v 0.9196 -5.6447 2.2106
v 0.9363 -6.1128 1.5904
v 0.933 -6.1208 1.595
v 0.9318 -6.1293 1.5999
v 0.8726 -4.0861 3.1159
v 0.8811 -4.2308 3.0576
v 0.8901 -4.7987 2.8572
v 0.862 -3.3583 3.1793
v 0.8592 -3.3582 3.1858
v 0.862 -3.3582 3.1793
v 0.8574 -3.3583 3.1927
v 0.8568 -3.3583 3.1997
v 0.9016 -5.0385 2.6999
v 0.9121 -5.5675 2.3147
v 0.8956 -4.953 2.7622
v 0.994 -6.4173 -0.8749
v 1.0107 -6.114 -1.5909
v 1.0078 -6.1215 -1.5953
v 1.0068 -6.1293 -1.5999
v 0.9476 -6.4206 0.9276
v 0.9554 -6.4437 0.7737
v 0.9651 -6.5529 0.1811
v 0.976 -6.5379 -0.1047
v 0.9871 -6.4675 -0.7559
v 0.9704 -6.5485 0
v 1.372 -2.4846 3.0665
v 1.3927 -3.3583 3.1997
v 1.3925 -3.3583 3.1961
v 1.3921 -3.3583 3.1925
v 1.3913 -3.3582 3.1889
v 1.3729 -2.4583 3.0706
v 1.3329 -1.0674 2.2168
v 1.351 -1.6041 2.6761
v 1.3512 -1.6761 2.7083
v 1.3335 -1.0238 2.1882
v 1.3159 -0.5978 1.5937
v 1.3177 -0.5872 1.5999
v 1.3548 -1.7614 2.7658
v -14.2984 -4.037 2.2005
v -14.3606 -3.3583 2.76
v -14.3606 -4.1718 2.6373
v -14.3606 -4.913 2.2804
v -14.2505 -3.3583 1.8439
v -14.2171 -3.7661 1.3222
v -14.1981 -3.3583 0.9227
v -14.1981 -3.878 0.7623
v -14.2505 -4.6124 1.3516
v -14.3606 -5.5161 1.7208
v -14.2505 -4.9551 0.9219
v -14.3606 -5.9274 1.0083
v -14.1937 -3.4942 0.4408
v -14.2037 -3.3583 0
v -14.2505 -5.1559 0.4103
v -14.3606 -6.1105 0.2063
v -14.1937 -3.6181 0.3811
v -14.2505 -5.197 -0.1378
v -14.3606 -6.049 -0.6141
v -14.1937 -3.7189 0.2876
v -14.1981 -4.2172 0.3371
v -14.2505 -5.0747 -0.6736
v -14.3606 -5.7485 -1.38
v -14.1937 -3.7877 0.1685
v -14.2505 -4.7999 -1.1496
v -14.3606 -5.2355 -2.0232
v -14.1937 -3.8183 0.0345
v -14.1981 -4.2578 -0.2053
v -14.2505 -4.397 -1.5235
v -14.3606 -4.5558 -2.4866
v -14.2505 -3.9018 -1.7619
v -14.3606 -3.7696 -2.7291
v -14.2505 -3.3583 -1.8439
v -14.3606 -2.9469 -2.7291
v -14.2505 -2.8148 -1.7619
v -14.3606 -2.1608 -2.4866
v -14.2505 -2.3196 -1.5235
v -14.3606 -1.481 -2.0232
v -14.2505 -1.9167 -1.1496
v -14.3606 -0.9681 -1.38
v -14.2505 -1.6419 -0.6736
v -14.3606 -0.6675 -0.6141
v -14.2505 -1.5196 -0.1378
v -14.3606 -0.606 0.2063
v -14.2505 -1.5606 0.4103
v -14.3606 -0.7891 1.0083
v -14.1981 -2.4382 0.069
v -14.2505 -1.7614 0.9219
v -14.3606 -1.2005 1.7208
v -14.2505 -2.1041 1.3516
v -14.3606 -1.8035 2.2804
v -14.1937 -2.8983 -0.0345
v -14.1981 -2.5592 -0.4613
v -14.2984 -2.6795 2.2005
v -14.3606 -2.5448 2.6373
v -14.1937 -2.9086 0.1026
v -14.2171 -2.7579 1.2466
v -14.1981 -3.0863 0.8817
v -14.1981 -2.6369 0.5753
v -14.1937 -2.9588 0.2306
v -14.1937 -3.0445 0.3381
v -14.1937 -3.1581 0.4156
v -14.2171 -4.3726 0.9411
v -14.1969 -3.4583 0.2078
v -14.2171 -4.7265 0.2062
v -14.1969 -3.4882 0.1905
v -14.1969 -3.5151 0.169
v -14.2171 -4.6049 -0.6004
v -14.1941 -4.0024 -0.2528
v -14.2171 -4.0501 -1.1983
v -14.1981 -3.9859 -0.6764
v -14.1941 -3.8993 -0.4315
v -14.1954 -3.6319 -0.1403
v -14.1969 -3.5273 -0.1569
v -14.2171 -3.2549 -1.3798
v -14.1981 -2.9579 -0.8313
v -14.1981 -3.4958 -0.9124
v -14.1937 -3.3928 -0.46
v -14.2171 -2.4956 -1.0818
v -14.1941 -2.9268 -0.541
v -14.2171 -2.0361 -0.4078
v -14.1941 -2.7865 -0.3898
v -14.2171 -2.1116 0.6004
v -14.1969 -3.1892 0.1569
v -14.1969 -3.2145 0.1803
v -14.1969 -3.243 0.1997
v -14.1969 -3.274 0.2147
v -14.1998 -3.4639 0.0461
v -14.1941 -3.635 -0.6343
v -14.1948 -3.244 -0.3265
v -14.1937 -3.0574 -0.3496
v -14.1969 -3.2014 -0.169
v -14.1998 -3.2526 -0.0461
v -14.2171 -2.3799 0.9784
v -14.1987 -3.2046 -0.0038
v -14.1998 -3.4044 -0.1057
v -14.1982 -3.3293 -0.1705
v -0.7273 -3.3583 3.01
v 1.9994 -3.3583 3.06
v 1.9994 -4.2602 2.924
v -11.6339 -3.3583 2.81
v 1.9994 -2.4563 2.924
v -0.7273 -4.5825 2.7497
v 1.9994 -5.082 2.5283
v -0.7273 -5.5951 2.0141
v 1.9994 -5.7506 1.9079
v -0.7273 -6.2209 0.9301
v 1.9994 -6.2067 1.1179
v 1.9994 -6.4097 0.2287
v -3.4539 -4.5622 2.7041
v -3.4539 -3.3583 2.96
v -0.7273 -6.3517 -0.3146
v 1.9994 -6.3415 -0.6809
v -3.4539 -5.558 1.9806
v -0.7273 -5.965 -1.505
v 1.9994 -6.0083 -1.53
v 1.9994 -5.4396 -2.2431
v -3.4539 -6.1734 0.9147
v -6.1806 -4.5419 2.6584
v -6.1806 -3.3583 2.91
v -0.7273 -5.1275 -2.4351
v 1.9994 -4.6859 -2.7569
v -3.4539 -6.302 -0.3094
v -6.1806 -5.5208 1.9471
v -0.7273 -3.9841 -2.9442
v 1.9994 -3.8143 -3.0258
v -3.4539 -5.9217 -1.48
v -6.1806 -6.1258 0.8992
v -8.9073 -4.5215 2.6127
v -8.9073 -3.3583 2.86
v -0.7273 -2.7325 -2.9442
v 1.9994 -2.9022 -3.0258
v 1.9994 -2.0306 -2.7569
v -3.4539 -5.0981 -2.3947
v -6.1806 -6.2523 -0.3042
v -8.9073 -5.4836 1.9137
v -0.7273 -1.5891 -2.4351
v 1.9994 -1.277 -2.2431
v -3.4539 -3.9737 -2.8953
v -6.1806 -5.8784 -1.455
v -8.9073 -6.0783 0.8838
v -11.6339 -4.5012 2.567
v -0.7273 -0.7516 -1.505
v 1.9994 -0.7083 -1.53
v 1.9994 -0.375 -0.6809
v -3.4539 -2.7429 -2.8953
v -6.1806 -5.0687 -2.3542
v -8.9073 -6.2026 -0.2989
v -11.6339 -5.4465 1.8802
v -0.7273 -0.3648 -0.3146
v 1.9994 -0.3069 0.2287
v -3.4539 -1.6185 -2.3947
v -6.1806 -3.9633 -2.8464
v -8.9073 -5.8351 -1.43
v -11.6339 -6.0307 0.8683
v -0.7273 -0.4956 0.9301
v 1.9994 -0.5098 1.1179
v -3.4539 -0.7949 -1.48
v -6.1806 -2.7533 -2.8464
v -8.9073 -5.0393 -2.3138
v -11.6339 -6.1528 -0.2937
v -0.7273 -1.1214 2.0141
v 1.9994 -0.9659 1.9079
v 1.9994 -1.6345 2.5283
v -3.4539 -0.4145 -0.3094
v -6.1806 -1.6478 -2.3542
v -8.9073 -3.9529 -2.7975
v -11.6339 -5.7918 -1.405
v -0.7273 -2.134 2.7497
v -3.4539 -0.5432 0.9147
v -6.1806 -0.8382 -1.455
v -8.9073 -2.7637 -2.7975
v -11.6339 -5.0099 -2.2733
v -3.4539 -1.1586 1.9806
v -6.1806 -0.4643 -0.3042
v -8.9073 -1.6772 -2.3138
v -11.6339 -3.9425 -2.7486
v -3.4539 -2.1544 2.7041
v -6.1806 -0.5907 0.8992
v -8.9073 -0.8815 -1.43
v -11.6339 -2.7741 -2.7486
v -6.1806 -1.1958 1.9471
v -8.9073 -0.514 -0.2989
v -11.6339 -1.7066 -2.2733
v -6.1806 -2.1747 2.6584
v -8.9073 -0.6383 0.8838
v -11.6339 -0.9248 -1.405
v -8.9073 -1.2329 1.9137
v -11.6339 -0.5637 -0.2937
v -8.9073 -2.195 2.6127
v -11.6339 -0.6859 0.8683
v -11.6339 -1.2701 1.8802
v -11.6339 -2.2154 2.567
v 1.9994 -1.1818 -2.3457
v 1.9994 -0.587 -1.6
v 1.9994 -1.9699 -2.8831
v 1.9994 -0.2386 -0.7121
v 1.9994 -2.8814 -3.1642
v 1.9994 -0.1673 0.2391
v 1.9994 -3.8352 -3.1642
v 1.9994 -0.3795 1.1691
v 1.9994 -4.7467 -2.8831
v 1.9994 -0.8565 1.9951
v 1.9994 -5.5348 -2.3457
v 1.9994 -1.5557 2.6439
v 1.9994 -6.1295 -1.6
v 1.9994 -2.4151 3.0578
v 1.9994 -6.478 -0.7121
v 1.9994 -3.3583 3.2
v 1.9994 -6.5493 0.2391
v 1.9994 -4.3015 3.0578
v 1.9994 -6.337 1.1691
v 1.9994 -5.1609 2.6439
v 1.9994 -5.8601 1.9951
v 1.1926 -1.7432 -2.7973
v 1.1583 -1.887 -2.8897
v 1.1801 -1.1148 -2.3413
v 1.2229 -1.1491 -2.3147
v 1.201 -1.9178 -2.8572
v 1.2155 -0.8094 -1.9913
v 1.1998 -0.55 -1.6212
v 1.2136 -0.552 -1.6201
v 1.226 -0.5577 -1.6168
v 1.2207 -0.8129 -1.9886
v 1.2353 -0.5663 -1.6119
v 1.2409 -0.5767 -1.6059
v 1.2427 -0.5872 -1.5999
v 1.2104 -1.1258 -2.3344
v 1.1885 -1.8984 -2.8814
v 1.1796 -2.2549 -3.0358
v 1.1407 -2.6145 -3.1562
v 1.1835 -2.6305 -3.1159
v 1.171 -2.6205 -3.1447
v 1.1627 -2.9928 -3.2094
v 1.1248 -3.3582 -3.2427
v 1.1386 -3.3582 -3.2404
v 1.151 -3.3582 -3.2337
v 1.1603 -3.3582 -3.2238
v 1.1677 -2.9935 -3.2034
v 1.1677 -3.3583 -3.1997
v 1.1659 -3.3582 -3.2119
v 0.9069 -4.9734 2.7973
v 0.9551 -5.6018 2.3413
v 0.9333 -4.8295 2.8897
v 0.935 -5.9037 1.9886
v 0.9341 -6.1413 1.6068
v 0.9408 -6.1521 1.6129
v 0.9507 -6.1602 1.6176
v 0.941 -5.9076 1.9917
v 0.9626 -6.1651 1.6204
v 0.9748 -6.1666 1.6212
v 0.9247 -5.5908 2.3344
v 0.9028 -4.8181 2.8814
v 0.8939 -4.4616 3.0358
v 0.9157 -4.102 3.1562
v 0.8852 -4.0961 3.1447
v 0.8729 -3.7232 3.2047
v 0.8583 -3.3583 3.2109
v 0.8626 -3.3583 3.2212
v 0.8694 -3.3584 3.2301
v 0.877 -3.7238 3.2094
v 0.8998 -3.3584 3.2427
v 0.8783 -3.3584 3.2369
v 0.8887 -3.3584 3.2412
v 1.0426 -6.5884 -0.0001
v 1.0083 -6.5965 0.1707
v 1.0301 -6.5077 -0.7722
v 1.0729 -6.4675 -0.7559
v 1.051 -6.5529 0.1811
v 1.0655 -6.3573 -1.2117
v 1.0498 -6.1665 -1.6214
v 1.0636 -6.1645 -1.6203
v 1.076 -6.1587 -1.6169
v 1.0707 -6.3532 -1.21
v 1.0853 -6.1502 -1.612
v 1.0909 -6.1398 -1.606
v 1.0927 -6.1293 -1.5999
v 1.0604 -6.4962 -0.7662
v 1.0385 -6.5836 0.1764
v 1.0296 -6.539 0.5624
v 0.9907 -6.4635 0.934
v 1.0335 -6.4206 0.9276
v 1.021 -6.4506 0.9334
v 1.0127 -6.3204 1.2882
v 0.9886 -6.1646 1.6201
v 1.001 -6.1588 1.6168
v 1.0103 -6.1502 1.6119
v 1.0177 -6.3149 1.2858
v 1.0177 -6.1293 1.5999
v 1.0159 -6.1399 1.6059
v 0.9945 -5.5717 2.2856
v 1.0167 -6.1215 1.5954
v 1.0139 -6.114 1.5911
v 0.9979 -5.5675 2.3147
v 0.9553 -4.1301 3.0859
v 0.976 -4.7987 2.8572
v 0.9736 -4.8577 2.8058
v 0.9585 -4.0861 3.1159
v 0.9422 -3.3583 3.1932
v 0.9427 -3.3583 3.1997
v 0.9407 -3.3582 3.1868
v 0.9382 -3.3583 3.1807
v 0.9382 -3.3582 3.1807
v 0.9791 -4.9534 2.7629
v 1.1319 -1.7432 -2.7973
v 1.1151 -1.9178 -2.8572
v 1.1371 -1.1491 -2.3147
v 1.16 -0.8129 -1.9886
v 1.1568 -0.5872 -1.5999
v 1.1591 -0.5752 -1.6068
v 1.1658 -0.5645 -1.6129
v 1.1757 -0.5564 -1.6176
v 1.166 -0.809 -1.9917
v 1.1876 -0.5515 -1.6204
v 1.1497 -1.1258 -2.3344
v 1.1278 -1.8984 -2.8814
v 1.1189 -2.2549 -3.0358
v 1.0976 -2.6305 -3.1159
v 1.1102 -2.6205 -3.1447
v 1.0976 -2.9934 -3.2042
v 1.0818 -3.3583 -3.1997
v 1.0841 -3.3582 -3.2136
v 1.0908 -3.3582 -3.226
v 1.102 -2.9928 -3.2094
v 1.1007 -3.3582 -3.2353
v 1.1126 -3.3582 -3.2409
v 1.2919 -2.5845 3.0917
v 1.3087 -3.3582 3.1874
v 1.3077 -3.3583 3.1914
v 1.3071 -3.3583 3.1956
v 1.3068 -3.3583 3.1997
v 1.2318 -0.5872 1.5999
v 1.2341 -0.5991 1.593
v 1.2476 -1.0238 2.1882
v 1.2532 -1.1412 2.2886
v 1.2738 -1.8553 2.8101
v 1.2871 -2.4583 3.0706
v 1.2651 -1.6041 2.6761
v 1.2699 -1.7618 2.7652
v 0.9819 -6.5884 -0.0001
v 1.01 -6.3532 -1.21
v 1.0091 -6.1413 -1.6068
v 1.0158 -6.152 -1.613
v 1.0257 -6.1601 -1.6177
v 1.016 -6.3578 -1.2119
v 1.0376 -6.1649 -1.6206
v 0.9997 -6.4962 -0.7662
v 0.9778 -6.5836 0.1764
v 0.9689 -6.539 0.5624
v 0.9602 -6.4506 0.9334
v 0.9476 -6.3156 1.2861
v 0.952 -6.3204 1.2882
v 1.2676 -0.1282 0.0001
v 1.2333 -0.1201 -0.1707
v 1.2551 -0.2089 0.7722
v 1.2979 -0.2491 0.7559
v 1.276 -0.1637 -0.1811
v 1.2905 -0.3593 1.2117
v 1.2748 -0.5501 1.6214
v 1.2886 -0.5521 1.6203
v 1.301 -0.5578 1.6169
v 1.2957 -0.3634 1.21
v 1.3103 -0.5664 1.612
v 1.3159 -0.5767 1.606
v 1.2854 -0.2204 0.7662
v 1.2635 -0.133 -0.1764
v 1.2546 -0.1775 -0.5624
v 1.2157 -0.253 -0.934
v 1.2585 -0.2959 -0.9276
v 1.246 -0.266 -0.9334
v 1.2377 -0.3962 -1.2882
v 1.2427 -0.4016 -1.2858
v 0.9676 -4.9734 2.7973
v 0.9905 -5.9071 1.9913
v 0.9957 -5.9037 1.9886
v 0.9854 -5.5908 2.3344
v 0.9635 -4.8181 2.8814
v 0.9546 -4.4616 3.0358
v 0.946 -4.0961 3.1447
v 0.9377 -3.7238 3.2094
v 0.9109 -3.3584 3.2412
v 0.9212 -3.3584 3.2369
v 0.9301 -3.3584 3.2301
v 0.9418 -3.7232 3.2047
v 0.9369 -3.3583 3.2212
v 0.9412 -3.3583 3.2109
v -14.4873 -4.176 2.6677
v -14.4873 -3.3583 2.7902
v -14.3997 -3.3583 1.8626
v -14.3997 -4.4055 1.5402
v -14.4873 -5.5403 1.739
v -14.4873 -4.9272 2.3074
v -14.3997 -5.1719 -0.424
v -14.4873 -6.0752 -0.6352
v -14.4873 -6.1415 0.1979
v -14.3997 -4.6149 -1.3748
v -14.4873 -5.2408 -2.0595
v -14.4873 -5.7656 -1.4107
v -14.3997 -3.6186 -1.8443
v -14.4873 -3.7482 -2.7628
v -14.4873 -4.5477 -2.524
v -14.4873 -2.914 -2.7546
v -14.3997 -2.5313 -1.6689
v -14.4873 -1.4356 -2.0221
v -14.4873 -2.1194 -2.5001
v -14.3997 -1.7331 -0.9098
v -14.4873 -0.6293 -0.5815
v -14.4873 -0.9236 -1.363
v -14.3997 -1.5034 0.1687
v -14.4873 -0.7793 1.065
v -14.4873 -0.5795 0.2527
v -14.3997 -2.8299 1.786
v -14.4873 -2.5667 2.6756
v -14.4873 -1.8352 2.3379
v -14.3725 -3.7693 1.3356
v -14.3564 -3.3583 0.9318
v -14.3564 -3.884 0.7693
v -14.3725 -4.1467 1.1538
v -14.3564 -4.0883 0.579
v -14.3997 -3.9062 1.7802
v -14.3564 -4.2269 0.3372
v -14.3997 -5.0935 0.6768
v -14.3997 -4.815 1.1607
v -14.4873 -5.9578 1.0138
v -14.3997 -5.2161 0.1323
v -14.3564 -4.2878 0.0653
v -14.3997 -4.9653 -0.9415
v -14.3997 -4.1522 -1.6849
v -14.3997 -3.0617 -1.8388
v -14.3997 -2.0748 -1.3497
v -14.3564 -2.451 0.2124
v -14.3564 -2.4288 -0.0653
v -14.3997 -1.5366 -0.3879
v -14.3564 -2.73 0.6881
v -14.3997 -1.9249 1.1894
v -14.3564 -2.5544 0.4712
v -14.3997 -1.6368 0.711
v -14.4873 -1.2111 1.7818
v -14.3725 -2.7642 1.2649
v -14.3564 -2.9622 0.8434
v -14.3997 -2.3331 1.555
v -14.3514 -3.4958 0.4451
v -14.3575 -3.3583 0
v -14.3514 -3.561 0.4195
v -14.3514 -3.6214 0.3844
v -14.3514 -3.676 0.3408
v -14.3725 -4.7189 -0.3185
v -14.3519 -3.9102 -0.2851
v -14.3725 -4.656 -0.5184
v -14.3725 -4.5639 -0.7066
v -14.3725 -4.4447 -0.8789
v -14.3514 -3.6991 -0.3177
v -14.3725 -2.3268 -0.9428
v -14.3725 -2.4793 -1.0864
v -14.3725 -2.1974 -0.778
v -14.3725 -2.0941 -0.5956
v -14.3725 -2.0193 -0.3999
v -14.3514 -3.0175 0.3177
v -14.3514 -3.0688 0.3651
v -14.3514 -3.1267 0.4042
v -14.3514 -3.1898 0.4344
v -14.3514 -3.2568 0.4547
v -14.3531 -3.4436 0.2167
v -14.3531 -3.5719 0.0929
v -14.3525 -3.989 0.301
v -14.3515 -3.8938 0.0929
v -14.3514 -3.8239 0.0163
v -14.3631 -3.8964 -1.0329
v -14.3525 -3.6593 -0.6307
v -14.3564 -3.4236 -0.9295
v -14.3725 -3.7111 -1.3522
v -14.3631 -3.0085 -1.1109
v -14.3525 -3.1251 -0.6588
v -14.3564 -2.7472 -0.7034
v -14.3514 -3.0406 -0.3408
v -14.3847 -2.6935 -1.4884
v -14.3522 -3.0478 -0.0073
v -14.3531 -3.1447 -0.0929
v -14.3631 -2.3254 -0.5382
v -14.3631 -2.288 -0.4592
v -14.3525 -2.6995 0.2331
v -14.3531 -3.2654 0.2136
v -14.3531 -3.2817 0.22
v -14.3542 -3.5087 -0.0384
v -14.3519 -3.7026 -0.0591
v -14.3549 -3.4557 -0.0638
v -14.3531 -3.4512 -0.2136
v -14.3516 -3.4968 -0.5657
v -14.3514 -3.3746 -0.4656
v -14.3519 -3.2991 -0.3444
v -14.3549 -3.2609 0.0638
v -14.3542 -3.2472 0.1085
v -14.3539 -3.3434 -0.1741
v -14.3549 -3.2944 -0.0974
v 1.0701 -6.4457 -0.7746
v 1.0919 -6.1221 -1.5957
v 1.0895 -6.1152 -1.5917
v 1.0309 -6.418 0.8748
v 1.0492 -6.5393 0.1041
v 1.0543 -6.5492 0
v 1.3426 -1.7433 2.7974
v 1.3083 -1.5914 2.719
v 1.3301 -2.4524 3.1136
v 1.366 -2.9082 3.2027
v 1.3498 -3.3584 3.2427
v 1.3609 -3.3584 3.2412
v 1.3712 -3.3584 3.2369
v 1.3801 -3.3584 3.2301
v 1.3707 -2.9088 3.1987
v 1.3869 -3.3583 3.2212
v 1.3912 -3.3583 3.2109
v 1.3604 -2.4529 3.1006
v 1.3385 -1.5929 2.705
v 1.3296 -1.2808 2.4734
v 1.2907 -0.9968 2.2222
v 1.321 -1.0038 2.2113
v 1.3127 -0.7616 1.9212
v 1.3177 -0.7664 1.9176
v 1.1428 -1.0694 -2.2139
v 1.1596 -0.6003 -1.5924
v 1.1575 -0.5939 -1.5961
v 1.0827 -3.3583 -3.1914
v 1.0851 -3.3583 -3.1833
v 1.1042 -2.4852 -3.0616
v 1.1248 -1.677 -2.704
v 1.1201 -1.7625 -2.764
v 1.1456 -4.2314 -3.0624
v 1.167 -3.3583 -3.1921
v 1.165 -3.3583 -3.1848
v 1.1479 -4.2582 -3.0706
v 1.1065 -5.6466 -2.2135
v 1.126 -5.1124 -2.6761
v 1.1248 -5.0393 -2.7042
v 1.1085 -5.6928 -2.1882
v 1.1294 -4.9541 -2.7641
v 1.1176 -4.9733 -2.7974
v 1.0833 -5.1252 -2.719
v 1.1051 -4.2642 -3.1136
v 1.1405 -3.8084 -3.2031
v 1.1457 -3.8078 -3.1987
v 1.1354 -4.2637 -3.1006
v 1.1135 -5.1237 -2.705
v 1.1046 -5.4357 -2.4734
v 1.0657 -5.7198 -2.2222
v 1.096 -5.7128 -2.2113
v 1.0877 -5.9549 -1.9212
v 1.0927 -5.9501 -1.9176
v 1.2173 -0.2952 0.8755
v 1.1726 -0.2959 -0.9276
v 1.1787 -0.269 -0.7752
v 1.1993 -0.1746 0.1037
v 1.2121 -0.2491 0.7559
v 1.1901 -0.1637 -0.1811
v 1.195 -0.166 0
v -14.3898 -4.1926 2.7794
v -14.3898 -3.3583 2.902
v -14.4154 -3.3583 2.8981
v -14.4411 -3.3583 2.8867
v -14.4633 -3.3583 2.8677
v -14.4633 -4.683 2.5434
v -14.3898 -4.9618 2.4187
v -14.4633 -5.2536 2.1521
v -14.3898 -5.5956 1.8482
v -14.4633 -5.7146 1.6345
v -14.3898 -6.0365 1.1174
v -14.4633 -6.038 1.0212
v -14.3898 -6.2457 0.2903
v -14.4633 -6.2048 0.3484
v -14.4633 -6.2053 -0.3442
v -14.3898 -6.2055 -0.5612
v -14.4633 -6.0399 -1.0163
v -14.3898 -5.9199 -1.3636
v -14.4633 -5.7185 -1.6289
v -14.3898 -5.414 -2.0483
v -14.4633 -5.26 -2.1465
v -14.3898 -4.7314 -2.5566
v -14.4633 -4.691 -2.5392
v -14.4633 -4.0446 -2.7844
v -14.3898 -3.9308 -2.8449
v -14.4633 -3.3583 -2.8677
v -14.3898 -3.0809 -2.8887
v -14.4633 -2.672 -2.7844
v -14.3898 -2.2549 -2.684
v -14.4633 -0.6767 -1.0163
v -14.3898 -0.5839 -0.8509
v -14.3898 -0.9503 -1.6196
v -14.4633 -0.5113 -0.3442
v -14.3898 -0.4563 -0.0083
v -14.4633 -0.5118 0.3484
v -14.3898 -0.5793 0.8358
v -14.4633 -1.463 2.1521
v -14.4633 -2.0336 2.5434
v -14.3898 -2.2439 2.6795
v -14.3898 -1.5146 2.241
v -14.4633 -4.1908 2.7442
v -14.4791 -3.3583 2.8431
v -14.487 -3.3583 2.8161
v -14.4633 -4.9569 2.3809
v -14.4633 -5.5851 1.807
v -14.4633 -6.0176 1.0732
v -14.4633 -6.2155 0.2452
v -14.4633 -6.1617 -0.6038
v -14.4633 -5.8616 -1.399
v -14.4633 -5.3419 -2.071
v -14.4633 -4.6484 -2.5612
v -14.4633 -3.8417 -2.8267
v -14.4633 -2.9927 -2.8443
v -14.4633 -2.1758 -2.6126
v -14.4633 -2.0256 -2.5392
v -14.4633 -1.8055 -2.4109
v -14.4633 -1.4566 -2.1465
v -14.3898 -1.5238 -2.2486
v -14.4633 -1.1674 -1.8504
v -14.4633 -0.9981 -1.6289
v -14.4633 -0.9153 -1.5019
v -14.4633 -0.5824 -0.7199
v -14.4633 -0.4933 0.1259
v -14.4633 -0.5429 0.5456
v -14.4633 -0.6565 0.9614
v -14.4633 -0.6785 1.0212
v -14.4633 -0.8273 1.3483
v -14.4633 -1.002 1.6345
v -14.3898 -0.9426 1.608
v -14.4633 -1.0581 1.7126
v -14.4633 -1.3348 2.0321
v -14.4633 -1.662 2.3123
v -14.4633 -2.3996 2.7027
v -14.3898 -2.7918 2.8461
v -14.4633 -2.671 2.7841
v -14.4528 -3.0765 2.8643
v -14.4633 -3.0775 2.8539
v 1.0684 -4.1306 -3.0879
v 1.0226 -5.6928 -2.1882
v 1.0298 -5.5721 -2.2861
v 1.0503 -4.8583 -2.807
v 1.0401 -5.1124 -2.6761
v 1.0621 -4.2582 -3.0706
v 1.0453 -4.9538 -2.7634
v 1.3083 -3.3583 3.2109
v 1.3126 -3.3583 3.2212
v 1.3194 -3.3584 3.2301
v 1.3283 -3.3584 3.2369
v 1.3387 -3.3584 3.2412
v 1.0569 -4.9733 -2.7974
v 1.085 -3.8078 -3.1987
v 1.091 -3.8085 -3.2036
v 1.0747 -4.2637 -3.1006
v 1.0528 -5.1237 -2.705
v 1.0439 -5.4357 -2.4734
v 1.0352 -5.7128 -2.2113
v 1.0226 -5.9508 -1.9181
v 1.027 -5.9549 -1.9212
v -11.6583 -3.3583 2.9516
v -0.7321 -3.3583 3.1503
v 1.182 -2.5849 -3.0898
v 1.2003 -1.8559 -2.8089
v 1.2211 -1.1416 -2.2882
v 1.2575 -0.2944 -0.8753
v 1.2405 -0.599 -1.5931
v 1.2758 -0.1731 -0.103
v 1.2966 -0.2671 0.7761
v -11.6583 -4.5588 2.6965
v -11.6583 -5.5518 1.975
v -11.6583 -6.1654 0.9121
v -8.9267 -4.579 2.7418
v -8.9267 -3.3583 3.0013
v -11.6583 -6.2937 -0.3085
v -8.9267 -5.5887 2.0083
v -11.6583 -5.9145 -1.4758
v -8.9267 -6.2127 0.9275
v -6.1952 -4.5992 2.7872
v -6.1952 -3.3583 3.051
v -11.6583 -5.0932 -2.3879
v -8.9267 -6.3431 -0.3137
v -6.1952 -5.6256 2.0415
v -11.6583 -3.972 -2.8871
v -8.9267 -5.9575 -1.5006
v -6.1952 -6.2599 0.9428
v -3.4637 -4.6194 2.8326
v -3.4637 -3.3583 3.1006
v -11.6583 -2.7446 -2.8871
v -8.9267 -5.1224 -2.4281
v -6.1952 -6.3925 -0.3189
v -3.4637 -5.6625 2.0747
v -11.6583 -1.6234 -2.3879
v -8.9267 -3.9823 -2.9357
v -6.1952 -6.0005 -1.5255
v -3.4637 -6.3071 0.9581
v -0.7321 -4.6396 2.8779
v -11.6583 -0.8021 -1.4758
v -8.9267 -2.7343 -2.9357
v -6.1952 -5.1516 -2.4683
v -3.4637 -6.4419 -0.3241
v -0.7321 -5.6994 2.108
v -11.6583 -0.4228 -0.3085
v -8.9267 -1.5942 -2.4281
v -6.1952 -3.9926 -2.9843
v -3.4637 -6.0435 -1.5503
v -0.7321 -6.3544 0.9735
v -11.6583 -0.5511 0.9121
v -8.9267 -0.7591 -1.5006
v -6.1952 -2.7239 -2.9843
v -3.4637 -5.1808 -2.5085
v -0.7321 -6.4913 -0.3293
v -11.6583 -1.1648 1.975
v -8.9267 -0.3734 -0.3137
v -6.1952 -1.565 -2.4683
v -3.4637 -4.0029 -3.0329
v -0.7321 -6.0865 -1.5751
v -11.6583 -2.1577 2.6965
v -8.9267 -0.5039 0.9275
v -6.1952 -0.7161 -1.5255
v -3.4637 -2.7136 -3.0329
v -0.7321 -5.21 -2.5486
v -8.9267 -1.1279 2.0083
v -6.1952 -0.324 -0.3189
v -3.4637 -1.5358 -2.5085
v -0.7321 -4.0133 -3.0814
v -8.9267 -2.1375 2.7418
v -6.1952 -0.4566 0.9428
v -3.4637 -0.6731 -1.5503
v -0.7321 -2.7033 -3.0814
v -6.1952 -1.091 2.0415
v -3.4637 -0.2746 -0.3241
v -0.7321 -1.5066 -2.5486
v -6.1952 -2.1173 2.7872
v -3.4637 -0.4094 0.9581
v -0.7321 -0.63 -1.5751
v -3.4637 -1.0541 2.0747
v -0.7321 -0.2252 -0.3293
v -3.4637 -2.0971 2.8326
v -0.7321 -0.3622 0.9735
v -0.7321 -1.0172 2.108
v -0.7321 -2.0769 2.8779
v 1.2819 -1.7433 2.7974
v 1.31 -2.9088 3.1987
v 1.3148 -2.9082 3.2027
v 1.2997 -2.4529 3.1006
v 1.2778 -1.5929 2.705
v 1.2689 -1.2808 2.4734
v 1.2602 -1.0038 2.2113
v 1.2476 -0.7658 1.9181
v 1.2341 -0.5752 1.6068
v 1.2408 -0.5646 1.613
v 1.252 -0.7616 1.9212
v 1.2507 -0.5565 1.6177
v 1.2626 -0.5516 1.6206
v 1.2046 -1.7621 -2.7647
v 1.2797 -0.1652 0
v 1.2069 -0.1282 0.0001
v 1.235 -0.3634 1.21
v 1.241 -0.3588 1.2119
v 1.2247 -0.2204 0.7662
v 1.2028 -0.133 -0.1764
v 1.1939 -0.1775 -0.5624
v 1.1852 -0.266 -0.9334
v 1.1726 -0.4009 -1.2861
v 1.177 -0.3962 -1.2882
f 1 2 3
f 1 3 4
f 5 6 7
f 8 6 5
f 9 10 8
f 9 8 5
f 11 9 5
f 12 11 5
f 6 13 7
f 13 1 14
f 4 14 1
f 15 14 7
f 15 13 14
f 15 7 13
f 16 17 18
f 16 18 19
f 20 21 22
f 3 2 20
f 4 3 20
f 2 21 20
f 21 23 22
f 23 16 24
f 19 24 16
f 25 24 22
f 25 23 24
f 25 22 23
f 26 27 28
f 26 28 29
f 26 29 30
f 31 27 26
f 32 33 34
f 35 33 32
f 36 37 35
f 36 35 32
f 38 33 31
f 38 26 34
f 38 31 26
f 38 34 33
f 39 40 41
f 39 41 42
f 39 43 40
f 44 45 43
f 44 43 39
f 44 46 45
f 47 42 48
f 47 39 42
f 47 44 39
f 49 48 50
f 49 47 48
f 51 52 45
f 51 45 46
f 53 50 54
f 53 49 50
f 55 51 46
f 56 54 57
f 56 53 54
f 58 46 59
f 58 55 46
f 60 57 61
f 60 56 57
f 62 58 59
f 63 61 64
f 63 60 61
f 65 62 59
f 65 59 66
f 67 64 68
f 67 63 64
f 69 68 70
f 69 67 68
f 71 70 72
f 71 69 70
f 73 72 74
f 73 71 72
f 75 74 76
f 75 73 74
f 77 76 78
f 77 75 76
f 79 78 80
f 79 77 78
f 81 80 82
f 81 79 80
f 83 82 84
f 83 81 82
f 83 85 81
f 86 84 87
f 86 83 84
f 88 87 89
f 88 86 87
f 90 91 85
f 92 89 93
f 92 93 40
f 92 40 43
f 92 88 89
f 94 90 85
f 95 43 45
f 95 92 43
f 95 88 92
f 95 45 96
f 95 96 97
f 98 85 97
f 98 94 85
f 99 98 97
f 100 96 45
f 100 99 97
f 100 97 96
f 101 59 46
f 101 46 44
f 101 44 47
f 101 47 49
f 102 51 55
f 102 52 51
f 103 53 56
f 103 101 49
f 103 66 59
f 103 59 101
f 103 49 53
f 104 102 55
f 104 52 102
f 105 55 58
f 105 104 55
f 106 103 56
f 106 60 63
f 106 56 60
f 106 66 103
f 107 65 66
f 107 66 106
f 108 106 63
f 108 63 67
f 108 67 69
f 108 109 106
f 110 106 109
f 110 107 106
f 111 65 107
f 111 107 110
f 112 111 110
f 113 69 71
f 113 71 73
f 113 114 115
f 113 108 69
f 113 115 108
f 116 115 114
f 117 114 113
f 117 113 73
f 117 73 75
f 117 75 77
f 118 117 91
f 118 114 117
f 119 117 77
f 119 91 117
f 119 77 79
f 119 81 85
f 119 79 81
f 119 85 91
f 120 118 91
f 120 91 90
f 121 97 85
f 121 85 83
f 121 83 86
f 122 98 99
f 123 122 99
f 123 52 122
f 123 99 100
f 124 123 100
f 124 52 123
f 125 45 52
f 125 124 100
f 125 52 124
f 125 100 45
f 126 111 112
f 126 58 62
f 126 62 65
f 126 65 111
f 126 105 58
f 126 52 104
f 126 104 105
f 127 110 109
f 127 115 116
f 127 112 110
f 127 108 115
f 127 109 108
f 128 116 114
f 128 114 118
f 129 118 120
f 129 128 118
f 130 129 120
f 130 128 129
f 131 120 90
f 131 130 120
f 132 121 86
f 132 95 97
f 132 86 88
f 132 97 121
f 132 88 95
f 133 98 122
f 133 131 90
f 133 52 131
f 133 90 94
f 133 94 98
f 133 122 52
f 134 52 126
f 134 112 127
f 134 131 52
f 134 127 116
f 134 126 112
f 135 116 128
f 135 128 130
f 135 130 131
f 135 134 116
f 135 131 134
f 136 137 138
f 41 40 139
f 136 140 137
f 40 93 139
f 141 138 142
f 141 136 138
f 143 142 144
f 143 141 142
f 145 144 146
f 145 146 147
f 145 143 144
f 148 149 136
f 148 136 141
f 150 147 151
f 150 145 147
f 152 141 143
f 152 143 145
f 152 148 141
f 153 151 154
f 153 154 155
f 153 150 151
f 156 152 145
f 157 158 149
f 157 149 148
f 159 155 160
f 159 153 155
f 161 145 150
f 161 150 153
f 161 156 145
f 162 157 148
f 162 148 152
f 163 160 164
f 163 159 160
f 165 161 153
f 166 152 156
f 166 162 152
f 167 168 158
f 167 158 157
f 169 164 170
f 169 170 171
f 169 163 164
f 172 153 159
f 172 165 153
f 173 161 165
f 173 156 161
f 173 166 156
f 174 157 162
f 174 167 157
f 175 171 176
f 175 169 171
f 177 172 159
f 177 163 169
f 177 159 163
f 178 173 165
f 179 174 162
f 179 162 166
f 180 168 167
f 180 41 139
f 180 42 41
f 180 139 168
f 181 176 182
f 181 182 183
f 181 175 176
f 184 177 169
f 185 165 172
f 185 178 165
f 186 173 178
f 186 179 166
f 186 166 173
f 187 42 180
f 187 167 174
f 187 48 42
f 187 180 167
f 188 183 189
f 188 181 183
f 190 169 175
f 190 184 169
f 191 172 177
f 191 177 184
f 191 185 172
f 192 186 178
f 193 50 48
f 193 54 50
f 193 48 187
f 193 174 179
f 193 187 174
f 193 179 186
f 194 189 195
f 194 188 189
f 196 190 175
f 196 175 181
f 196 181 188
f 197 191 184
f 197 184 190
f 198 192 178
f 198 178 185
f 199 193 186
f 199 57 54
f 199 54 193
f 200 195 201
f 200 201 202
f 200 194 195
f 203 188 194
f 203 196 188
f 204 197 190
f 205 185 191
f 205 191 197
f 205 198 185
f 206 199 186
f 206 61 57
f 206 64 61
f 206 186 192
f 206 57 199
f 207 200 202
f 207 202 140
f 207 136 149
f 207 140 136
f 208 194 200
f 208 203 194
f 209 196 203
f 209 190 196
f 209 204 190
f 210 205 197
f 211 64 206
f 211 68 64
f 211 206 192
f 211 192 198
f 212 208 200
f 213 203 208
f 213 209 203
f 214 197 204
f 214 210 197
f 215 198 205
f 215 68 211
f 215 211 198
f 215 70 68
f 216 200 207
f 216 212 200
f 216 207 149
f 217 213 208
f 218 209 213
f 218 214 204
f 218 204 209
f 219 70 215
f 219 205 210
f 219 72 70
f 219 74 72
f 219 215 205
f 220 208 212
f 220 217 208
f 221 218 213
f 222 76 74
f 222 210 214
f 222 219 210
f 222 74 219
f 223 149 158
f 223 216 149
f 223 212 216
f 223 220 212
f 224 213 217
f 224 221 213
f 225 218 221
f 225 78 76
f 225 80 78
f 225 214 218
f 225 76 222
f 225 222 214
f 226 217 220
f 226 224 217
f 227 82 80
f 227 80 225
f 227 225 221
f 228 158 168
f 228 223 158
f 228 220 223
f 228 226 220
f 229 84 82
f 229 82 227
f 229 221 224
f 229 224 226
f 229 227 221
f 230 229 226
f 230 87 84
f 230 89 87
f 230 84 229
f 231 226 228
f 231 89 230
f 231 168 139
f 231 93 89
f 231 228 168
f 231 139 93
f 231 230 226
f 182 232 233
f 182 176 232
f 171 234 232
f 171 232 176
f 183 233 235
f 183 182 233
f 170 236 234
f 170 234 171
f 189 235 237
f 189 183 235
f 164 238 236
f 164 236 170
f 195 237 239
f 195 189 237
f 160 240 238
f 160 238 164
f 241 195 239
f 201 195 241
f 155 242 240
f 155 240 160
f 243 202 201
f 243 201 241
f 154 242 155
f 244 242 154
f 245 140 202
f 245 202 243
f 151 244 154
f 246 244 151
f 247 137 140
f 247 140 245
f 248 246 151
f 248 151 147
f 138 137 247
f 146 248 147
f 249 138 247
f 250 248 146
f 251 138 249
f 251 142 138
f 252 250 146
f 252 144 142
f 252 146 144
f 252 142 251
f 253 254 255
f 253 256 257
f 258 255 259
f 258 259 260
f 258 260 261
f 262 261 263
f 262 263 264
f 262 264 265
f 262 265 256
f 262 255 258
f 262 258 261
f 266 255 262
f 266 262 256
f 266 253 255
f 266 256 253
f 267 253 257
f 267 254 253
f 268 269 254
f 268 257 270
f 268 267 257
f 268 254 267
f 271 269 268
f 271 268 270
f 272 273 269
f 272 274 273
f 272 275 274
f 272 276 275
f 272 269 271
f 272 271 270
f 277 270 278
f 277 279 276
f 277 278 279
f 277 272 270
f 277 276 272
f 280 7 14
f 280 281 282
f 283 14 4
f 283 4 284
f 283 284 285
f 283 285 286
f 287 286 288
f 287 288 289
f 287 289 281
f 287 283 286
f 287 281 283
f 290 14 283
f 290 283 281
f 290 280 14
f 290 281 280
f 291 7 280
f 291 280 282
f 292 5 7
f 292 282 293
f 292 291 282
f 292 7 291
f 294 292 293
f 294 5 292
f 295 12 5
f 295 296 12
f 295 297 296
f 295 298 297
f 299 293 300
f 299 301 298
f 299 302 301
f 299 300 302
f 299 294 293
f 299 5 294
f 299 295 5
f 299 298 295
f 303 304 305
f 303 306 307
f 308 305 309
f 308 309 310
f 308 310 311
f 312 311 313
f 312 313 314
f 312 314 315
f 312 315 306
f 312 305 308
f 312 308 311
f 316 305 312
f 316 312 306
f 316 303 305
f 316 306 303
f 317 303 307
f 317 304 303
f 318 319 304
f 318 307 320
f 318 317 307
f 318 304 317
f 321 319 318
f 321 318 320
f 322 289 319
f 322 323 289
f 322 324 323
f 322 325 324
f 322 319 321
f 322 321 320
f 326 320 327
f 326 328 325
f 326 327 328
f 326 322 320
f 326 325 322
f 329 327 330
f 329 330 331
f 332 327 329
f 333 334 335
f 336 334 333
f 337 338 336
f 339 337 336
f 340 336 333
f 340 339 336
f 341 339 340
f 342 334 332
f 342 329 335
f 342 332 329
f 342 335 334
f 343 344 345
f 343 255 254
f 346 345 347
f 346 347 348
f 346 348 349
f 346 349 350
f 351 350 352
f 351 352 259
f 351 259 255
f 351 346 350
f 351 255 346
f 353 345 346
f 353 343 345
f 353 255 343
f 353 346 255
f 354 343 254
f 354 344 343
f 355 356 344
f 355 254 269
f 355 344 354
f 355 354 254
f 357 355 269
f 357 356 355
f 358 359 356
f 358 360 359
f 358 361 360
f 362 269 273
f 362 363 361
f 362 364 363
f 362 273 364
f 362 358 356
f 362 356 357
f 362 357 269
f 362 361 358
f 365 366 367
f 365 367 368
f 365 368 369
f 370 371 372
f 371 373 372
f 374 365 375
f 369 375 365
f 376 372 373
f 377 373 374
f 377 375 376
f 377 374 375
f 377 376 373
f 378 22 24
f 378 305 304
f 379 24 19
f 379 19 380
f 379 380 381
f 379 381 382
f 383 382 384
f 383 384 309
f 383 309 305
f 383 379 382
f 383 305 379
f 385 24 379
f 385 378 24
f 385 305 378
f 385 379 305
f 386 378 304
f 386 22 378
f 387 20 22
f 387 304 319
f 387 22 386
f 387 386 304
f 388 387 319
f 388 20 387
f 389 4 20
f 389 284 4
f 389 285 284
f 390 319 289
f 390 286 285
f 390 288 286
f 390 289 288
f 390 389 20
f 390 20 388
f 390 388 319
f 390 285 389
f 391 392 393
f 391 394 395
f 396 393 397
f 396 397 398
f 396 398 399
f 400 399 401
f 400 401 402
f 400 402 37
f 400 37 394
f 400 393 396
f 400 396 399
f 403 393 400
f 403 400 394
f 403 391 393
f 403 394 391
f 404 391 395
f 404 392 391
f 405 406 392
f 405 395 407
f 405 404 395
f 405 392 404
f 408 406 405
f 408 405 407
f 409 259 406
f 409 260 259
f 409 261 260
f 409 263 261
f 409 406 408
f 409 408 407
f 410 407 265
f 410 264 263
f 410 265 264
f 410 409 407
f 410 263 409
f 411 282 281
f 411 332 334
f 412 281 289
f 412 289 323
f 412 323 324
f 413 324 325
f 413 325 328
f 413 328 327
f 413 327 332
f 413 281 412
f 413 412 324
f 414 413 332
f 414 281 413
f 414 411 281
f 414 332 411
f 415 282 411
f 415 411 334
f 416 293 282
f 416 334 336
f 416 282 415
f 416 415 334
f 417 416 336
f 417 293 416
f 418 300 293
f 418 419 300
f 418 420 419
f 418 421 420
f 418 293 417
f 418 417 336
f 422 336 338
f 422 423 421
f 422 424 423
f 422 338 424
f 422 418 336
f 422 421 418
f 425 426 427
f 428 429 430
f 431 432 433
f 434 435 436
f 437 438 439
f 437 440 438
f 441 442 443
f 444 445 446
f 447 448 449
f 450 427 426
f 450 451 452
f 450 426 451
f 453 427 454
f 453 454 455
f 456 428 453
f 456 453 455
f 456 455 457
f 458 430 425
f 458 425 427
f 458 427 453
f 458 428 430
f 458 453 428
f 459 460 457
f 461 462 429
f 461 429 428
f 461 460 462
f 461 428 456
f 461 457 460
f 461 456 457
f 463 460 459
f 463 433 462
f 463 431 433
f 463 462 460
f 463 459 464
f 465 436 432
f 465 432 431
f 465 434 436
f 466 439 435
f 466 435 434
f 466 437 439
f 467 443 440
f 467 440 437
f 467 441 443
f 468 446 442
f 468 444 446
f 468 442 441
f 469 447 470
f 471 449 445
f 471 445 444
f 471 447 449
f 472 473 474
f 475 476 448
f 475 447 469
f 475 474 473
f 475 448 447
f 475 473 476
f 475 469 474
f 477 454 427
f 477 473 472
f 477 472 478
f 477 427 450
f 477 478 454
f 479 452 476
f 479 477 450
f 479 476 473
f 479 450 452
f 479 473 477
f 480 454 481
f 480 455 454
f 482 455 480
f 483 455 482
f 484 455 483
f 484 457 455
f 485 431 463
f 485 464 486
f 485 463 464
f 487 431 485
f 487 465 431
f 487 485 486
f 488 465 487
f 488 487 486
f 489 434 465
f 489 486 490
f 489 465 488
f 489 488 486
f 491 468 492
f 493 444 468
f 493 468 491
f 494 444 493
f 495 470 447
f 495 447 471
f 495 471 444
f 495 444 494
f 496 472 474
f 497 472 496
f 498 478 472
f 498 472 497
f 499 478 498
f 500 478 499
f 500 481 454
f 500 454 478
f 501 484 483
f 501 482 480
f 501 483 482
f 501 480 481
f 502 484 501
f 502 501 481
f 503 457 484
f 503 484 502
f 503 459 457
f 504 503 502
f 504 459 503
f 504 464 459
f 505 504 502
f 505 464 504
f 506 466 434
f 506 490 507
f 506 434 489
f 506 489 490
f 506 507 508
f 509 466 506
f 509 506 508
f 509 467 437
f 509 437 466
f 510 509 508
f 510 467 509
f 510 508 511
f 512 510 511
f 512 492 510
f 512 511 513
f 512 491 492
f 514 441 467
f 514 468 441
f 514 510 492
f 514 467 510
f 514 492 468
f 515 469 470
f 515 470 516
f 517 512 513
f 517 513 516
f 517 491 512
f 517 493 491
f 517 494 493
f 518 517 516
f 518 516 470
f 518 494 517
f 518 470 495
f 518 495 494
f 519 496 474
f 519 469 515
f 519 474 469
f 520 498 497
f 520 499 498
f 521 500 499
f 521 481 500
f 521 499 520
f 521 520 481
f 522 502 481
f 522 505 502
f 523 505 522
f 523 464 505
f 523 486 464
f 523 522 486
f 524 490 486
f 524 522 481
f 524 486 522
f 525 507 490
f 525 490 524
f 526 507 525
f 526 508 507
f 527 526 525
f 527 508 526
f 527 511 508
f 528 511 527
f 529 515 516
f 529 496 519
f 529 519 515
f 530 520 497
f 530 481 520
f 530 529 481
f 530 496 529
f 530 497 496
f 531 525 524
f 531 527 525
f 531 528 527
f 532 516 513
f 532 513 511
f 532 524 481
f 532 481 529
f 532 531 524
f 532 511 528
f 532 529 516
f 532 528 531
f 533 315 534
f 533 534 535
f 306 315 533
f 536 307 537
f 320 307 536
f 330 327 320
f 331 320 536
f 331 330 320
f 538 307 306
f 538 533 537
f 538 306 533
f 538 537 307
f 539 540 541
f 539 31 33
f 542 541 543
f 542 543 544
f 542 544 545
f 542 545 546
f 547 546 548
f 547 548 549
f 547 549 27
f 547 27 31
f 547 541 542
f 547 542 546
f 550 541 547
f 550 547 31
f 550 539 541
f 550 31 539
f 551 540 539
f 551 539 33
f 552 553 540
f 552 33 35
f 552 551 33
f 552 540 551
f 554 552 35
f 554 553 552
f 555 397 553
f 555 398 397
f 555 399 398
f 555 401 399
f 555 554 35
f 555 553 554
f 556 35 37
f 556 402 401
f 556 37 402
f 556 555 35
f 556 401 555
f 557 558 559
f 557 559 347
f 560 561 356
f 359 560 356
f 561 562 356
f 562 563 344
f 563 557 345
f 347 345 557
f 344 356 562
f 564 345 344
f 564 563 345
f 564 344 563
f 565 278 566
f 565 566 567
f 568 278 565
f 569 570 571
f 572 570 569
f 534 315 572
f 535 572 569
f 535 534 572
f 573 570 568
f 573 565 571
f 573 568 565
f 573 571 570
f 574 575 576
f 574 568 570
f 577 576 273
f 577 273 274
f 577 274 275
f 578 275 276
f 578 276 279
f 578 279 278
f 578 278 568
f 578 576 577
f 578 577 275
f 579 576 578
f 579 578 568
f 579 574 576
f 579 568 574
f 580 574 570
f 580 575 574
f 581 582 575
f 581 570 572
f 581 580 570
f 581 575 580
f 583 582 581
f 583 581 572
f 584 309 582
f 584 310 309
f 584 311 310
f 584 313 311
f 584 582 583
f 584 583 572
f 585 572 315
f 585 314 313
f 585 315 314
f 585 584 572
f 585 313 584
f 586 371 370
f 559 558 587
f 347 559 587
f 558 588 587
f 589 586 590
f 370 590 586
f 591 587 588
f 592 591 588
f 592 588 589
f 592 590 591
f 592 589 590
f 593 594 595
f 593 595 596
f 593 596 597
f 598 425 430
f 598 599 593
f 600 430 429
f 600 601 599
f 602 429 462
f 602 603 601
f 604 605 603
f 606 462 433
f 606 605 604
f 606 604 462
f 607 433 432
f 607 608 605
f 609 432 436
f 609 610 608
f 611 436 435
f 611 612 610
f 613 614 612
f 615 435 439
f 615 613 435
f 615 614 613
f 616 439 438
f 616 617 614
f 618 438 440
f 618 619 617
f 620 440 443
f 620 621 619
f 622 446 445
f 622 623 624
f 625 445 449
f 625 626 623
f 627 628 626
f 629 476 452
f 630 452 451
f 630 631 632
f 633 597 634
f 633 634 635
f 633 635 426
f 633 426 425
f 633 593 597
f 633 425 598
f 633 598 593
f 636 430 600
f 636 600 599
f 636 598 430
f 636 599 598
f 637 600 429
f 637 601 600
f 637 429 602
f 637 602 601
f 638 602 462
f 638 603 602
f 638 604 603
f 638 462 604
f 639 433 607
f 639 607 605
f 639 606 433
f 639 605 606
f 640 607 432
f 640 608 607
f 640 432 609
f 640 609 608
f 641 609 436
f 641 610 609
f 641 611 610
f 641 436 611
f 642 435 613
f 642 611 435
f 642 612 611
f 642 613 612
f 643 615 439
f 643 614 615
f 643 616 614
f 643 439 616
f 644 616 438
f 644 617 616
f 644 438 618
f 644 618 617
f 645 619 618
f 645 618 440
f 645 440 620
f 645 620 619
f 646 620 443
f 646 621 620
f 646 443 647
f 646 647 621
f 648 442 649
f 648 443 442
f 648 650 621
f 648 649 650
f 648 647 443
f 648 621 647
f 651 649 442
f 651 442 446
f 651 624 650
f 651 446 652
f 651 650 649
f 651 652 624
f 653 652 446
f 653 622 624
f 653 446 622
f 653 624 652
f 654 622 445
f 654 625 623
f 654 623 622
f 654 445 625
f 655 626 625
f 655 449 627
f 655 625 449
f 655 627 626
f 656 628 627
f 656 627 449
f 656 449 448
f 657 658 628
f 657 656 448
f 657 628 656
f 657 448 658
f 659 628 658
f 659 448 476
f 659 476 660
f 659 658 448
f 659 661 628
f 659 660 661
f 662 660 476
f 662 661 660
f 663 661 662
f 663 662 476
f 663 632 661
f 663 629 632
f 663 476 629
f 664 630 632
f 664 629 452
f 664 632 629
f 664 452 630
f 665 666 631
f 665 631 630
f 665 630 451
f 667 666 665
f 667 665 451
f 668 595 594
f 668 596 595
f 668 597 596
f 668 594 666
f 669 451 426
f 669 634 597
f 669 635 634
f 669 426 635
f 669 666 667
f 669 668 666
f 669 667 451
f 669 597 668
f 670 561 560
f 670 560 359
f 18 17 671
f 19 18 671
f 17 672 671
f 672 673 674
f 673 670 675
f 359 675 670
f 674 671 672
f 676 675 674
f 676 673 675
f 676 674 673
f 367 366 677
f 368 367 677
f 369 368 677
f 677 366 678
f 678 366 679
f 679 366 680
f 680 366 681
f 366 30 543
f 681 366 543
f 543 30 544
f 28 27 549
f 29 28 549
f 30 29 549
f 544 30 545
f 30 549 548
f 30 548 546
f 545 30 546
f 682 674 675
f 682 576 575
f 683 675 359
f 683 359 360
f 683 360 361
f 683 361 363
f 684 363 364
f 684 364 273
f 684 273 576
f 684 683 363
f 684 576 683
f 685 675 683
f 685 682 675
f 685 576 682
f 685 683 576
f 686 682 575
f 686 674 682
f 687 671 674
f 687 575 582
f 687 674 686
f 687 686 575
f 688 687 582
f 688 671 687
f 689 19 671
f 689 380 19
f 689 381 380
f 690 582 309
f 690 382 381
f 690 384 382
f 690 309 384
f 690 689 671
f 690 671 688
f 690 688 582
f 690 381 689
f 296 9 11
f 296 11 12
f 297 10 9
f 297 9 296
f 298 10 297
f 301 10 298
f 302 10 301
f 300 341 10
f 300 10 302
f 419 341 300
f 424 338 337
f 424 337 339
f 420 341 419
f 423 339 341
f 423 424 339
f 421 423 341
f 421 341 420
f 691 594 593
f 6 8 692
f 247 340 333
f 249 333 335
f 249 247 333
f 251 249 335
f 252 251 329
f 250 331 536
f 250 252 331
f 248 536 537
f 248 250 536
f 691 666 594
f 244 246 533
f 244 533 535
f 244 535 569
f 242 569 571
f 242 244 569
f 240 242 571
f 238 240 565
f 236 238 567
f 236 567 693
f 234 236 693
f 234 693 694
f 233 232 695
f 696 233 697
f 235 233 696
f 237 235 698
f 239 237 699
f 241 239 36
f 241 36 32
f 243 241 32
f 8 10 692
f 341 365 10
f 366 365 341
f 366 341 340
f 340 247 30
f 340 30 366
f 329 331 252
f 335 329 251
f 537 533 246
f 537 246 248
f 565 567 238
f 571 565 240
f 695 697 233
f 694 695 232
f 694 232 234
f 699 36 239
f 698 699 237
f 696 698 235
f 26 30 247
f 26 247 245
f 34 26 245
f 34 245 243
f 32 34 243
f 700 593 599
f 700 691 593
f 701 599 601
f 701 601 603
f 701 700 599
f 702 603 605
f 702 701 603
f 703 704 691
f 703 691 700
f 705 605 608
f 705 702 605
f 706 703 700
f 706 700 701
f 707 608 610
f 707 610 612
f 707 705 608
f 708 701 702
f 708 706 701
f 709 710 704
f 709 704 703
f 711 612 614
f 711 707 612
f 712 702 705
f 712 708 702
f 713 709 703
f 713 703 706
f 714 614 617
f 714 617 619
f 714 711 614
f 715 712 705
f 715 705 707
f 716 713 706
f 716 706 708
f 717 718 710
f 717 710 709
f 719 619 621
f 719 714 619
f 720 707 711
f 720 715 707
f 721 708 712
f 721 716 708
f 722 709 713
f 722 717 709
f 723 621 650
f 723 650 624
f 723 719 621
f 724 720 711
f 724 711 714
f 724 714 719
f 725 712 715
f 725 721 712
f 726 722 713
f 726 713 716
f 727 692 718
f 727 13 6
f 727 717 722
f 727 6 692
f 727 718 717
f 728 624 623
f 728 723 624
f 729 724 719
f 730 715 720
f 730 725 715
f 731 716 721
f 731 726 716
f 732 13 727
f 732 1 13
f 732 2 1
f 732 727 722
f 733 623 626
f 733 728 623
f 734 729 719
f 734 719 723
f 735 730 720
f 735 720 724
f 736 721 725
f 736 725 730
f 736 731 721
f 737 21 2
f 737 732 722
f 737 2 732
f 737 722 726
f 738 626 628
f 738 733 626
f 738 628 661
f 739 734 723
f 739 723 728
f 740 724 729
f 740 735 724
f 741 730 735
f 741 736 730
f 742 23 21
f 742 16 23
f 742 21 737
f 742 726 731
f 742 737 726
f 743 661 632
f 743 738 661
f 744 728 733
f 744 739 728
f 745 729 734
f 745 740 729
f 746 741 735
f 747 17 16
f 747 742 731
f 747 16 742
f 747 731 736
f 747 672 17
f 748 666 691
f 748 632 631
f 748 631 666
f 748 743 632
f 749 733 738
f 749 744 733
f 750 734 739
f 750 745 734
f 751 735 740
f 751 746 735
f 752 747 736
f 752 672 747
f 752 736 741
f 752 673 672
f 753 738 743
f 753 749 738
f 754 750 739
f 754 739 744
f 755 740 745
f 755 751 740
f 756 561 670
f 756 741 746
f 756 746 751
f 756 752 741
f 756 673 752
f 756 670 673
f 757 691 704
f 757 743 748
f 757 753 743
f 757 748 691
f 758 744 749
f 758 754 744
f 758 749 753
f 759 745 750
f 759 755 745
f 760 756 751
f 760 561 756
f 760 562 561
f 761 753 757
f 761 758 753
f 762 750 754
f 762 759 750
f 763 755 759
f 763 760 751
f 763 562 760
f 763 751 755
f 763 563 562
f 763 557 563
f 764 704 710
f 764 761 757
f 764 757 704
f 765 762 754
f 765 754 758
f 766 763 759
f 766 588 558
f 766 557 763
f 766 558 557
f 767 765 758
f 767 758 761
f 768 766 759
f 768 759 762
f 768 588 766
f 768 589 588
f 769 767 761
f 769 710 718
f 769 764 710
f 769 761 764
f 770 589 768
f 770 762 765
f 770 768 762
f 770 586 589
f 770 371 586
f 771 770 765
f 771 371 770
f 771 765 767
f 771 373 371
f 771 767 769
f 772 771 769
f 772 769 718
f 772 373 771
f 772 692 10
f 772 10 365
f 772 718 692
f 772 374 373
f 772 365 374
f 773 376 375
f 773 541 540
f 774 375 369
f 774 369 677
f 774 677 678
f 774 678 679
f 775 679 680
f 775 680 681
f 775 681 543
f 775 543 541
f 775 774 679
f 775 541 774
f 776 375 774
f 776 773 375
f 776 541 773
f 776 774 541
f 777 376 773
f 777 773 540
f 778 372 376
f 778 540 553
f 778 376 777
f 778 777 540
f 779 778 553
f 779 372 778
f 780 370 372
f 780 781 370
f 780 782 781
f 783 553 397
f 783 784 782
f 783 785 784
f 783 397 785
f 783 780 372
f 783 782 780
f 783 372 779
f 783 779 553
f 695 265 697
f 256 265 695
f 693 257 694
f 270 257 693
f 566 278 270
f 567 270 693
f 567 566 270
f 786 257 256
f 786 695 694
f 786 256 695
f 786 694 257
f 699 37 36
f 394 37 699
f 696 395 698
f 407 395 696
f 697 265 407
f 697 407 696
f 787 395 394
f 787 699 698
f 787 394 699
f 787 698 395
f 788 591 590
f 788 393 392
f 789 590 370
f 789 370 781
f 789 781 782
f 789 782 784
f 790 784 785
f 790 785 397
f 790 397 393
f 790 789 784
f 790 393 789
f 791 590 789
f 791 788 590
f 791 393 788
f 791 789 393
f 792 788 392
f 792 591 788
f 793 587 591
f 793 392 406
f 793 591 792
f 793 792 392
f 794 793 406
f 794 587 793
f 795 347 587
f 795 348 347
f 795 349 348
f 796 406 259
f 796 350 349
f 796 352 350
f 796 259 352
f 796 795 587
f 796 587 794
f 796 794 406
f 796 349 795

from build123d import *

# Parameters (mm, degrees)
SWEEP_1_PITCH = 0.45
FILLET_3_R    = 0.1


with BuildPart() as part:
    # 草图1 → 旋转3 (revolve)
    with BuildSketch(Plane.XY, mode=Mode.PRIVATE) as revolve_3_sk:
        with BuildLine():
            Line((-14.500599108, -0.458323283), (1.999400892, -0.158323283))
            Line((1.999400892, -0.158323283), (1.999400892, -0.298323283))
            Line((1.999400892, -0.298323283), (-14.360599108, -0.598323283))
            ThreePointArc((-14.360599108, -0.598323283), (-14.217076798, -1.974601707), (-14.203691623, -3.358278617))
            Line((-14.203691623, -3.358278617), (-14.357505029, -3.358278617))
            ThreePointArc((-14.357505029, -3.358278617), (-14.375184367, -1.905642927), (-14.500599108, -0.458323283))
        make_face()
    revolve(revolve_3_sk.sketch.rotate(Axis((-14.483691623, -3.358278617, 0), (1, 0, 0)), 90), axis=Axis((-14.483691623, -3.358278617, 0), (1, 0, 0)))

    # 扫描1: arcs per turn and ends read off the stored shape
    # 扫描1: the profile of 草图9 screwed along a right-hand helix through 1 turns, 6 arcs to a turn; built about Z, then put on its axis
    sweep_1_z = Axis((0, 0, 0), (0, 0, 1))
    sweep_1_corners = [(3.199748648, 5.52e-07, 0.407301454), (3.15682446, 0.000111601, 0.450225786), (3.199748648, 5.52e-07, 0.493150117), (3.242672835, -0.000110498, 0.450225786)]
    with BuildLine(mode=Mode.PRIVATE) as sweep_1_profile:
        ThreePointArc((3.199748648, 5.52e-07, 0.407301454), (3.169396663, 7.9075e-05, 0.4198737), (3.15682446, 0.000111601, 0.450225786))
        ThreePointArc((3.15682446, 0.000111601, 0.450225786), (3.169396663, 7.9075e-05, 0.480577871), (3.199748648, 5.52e-07, 0.493150117))
        ThreePointArc((3.199748648, 5.52e-07, 0.493150117), (3.230100632, -7.7972e-05, 0.480577871), (3.242672835, -0.000110498, 0.450225786))
        ThreePointArc((3.242672835, -0.000110498, 0.450225786), (3.230100632, -7.7972e-05, 0.4198737), (3.199748648, 5.52e-07, 0.407301454))
    sweep_1_cap = Face(sweep_1_profile.wire())
    sweep_1_arcs = [((3.199748648, 5.52e-07, 0.407301454), (3.15682446, 0.000111601, 0.407301454), (3.15682446, 0.000111601, 0.450225786), (1, 0.7071067811865475, 1)), ((3.15682446, 0.000111601, 0.450225786), (3.15682446, 0.000111601, 0.493150117), (3.199748648, 5.52e-07, 0.493150117), (1, 0.7071067811865475, 1)), ((3.199748648, 5.52e-07, 0.493150117), (3.242672835, -0.000110498, 0.493150117), (3.242672835, -0.000110498, 0.450225786), (1, 0.7071067811865475, 1)), ((3.242672835, -0.000110498, 0.450225786), (3.242672835, -0.000110498, 0.407301454), (3.199748648, 5.52e-07, 0.407301454), (1, 0.7071067811865475, 1))]  # start, shoulder, end, weights
    sweep_1_turn_angles = [0, 30, 60, 90, 120, 150, 180, 210, 240, 270, 300, 330, 360]
    sweep_1_turn_weights = [1, 0.8660254037844387, 1, 0.8660254037844387, 1, 0.8660254037844387, 1, 0.8660254037844387, 1, 0.8660254037844387, 1, 0.8660254037844387, 1]
    sweep_1_turn_sides = [Face.make_bezier_surface([[Vector(p[j][0], p[j][1], 0).rotate(sweep_1_z, sweep_1_turn_angles[2 * i + k]) / sweep_1_turn_weights[2 * i + k] + Vector(0, 0, p[j][2] + SWEEP_1_PITCH * sweep_1_turn_angles[2 * i + k] / 360) for k in range(3)] for j in range(3)], [[p[3][j] * sweep_1_turn_weights[2 * i + k] for k in range(3)] for j in range(3)]) for p in sweep_1_arcs for i in range(6)]
    sweep_1 = Plane(origin=(1.8, -3.358278617, 0), x_dir=(0, 0, 1), z_dir=(-1, 0, 0)) * Solid(Shell([*sweep_1_turn_sides, sweep_1_cap, sweep_1_cap.rotate(sweep_1_z, 360).moved(Location((0, 0, SWEEP_1_PITCH * 360 / 360)))]))
    add(sweep_1)

    # 圆角3
    fillet_3_edges = [part.edges().sort_by_distance(p)[0] for p in [
        (-14.500599108, -3.358278617, -2.899955334),
    ]]
    fillet(fillet_3_edges, radius=FILLET_3_R)


solid = part.part
